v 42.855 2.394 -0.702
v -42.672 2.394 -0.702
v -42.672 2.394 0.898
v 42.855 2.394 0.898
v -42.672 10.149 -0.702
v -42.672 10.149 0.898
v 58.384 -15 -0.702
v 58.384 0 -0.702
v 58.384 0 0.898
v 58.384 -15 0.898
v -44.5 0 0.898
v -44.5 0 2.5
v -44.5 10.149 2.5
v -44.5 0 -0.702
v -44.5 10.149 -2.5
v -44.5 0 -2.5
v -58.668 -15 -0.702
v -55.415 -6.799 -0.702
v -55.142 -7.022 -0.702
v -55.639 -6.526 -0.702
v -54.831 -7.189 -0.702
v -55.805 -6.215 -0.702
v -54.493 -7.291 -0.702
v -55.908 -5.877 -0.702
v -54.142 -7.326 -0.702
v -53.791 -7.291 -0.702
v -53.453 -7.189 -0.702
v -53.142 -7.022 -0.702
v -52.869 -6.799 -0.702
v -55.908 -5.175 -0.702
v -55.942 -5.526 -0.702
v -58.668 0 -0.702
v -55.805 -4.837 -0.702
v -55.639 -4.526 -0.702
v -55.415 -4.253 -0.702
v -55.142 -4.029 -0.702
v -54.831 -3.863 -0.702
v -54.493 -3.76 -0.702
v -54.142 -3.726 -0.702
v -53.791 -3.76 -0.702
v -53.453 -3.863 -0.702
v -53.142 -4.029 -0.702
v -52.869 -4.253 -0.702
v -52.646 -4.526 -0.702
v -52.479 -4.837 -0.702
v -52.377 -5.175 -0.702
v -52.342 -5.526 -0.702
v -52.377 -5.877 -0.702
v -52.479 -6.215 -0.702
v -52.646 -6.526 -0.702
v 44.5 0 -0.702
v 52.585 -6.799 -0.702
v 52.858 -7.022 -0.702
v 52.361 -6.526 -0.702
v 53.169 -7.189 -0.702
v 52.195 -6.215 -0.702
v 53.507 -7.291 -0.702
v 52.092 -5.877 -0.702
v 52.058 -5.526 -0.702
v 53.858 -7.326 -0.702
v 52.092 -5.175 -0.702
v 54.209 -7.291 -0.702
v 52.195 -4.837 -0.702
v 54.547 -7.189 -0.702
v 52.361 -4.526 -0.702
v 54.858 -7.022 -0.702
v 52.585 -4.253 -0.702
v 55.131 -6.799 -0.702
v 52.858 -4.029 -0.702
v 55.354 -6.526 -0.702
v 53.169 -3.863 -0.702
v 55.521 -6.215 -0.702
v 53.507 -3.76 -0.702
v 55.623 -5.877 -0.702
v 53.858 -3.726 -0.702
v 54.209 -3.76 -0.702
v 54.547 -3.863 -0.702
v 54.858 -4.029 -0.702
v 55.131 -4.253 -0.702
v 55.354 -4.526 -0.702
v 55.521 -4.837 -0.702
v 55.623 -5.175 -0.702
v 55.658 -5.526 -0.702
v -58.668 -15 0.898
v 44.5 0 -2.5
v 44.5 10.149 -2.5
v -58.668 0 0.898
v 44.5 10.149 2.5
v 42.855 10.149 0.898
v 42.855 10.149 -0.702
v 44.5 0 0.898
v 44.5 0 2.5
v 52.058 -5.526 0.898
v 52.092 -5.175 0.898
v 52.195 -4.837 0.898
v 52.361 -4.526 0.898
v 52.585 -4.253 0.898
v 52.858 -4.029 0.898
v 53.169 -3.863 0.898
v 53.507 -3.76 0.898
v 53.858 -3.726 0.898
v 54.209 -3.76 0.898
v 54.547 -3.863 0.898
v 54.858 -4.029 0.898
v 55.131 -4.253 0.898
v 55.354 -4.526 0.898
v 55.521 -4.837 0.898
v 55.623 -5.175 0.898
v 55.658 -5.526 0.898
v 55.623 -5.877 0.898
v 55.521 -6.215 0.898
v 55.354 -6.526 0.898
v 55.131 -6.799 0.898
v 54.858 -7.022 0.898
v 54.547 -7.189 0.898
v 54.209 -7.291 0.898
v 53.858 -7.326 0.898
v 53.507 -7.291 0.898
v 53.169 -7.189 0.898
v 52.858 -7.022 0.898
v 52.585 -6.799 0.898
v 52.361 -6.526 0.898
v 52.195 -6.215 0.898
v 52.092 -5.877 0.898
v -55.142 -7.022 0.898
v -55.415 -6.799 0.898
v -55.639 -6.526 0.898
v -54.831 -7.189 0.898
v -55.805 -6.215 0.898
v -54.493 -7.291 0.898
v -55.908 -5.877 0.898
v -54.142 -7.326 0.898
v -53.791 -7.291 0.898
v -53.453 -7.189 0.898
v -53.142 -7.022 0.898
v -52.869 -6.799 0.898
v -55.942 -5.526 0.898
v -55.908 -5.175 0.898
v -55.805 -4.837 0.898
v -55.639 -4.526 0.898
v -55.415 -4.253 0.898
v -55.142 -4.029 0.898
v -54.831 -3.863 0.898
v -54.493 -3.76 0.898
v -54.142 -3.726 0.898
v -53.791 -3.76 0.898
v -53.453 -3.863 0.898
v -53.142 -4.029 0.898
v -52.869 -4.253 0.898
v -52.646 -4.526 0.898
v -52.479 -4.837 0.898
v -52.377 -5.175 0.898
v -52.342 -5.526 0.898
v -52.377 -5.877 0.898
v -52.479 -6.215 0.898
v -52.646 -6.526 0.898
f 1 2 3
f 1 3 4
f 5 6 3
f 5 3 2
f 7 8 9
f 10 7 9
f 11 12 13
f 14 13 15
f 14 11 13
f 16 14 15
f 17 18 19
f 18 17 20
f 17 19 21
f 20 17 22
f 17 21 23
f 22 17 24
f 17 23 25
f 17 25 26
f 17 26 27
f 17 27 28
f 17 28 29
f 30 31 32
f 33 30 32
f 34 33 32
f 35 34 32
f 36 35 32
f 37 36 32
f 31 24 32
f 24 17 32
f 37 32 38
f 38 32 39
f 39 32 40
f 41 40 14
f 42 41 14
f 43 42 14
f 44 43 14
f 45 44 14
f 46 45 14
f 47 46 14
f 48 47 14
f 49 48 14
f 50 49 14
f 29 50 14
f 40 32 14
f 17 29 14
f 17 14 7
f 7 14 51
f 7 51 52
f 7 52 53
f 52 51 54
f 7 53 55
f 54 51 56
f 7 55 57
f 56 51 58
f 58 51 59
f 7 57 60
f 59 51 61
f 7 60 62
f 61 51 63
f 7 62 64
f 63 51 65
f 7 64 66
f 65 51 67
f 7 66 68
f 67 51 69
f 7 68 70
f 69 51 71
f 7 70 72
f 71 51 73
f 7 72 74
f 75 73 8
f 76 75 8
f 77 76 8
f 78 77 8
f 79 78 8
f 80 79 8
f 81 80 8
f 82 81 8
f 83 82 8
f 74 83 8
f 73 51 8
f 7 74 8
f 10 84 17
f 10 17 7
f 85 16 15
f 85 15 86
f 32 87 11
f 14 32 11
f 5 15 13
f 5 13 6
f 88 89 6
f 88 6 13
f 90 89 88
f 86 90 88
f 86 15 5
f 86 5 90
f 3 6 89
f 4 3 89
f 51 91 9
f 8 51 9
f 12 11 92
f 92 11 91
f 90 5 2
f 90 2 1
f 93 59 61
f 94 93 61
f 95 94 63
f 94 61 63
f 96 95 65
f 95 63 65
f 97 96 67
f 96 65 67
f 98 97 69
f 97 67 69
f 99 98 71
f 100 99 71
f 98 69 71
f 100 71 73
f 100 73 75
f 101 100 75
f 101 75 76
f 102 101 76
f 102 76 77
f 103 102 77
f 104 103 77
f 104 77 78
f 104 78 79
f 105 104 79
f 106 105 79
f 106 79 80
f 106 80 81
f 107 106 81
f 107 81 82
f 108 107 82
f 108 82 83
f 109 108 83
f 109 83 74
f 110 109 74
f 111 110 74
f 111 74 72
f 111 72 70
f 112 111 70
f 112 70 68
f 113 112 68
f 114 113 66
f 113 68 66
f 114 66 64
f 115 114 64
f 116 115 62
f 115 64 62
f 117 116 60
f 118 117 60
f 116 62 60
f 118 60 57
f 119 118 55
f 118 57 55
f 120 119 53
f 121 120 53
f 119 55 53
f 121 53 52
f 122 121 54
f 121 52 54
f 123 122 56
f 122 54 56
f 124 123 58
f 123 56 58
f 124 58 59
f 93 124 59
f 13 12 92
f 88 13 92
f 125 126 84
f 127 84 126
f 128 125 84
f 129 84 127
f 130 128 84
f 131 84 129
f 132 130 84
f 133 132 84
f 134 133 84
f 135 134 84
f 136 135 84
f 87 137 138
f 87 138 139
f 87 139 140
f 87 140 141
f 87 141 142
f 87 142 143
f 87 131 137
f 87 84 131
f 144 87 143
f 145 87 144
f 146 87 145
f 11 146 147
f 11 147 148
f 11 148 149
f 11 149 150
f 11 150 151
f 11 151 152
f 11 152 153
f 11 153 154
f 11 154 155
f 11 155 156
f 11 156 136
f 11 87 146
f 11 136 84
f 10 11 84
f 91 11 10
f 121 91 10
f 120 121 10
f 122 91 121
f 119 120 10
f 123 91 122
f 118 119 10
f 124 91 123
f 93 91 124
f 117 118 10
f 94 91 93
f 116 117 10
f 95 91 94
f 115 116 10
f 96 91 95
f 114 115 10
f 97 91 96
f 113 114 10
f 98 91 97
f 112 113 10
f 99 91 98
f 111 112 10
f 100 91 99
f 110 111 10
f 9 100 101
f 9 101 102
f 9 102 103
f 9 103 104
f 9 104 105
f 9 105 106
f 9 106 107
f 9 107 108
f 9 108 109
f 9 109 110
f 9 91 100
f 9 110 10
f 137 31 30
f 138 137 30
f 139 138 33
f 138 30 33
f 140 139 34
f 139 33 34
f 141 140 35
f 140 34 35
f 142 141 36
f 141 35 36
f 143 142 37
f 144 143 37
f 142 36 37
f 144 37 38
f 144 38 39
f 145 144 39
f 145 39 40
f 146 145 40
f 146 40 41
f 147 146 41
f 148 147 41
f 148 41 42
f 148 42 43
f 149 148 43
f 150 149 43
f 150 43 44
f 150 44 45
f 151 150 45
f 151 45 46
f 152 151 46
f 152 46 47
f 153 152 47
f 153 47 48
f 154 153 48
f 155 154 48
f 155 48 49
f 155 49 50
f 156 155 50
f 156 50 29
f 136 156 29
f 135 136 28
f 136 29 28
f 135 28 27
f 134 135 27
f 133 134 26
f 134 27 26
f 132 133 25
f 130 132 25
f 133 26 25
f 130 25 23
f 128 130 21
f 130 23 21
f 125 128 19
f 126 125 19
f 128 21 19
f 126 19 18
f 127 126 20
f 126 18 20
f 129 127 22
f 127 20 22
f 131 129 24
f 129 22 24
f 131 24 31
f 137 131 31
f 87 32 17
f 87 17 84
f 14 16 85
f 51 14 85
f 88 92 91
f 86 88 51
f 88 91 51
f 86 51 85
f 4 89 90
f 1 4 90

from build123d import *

# Parameters (mm, degrees)
SKETCH1_W            = 89
SKETCH1_H            = 5
BOSS_EXTRUDE1_DEPTH  = 10.14943
SKETCH2_W            = 85.527
SKETCH2_H            = 1.6
CUT_EXTRUDE1_DEPTH   = 7.7558
SKETCH3_W            = 117.05158
SKETCH3_H            = 1.6
BOSS_EXTRUDE2_DEPTH  = 15
M3_CLEARANCE_HOLE1_D = 3.6


with BuildPart() as part:
    # Sketch1 → Boss-Extrude1 (new body)
    with BuildSketch(Plane(origin=(0, 0, 0), x_dir=(1, 0, 0), z_dir=(0, 1, 0))):
        Rectangle(SKETCH1_W, SKETCH1_H)
    extrude(amount=BOSS_EXTRUDE1_DEPTH)

    # Sketch2 → Cut-Extrude1 (cut)
    with BuildSketch(Plane(origin=(0, 10.14943, 0), x_dir=(1, 0, 0), z_dir=(0, 1, 0))):
        with Locations((0.0912, -0.097552871)):
            Rectangle(SKETCH2_W, SKETCH2_H)
    extrude(amount=-CUT_EXTRUDE1_DEPTH, mode=Mode.SUBTRACT)

    # Sketch3 → Boss-Extrude2 (add)
    with BuildSketch(Plane.XZ):
        with Locations((-0.14221, 0.097552871)):
            Rectangle(SKETCH3_W, SKETCH3_H)
    extrude(amount=BOSS_EXTRUDE2_DEPTH)

    # M3 Clearance Hole1 (through all)
    with Locations(Plane.XY.offset(0.897552871)):
        with Locations((-54.14221, -5.5258), (53.85779, -5.5258)):
            Hole(M3_CLEARANCE_HOLE1_D / 2)


solid = part.part
